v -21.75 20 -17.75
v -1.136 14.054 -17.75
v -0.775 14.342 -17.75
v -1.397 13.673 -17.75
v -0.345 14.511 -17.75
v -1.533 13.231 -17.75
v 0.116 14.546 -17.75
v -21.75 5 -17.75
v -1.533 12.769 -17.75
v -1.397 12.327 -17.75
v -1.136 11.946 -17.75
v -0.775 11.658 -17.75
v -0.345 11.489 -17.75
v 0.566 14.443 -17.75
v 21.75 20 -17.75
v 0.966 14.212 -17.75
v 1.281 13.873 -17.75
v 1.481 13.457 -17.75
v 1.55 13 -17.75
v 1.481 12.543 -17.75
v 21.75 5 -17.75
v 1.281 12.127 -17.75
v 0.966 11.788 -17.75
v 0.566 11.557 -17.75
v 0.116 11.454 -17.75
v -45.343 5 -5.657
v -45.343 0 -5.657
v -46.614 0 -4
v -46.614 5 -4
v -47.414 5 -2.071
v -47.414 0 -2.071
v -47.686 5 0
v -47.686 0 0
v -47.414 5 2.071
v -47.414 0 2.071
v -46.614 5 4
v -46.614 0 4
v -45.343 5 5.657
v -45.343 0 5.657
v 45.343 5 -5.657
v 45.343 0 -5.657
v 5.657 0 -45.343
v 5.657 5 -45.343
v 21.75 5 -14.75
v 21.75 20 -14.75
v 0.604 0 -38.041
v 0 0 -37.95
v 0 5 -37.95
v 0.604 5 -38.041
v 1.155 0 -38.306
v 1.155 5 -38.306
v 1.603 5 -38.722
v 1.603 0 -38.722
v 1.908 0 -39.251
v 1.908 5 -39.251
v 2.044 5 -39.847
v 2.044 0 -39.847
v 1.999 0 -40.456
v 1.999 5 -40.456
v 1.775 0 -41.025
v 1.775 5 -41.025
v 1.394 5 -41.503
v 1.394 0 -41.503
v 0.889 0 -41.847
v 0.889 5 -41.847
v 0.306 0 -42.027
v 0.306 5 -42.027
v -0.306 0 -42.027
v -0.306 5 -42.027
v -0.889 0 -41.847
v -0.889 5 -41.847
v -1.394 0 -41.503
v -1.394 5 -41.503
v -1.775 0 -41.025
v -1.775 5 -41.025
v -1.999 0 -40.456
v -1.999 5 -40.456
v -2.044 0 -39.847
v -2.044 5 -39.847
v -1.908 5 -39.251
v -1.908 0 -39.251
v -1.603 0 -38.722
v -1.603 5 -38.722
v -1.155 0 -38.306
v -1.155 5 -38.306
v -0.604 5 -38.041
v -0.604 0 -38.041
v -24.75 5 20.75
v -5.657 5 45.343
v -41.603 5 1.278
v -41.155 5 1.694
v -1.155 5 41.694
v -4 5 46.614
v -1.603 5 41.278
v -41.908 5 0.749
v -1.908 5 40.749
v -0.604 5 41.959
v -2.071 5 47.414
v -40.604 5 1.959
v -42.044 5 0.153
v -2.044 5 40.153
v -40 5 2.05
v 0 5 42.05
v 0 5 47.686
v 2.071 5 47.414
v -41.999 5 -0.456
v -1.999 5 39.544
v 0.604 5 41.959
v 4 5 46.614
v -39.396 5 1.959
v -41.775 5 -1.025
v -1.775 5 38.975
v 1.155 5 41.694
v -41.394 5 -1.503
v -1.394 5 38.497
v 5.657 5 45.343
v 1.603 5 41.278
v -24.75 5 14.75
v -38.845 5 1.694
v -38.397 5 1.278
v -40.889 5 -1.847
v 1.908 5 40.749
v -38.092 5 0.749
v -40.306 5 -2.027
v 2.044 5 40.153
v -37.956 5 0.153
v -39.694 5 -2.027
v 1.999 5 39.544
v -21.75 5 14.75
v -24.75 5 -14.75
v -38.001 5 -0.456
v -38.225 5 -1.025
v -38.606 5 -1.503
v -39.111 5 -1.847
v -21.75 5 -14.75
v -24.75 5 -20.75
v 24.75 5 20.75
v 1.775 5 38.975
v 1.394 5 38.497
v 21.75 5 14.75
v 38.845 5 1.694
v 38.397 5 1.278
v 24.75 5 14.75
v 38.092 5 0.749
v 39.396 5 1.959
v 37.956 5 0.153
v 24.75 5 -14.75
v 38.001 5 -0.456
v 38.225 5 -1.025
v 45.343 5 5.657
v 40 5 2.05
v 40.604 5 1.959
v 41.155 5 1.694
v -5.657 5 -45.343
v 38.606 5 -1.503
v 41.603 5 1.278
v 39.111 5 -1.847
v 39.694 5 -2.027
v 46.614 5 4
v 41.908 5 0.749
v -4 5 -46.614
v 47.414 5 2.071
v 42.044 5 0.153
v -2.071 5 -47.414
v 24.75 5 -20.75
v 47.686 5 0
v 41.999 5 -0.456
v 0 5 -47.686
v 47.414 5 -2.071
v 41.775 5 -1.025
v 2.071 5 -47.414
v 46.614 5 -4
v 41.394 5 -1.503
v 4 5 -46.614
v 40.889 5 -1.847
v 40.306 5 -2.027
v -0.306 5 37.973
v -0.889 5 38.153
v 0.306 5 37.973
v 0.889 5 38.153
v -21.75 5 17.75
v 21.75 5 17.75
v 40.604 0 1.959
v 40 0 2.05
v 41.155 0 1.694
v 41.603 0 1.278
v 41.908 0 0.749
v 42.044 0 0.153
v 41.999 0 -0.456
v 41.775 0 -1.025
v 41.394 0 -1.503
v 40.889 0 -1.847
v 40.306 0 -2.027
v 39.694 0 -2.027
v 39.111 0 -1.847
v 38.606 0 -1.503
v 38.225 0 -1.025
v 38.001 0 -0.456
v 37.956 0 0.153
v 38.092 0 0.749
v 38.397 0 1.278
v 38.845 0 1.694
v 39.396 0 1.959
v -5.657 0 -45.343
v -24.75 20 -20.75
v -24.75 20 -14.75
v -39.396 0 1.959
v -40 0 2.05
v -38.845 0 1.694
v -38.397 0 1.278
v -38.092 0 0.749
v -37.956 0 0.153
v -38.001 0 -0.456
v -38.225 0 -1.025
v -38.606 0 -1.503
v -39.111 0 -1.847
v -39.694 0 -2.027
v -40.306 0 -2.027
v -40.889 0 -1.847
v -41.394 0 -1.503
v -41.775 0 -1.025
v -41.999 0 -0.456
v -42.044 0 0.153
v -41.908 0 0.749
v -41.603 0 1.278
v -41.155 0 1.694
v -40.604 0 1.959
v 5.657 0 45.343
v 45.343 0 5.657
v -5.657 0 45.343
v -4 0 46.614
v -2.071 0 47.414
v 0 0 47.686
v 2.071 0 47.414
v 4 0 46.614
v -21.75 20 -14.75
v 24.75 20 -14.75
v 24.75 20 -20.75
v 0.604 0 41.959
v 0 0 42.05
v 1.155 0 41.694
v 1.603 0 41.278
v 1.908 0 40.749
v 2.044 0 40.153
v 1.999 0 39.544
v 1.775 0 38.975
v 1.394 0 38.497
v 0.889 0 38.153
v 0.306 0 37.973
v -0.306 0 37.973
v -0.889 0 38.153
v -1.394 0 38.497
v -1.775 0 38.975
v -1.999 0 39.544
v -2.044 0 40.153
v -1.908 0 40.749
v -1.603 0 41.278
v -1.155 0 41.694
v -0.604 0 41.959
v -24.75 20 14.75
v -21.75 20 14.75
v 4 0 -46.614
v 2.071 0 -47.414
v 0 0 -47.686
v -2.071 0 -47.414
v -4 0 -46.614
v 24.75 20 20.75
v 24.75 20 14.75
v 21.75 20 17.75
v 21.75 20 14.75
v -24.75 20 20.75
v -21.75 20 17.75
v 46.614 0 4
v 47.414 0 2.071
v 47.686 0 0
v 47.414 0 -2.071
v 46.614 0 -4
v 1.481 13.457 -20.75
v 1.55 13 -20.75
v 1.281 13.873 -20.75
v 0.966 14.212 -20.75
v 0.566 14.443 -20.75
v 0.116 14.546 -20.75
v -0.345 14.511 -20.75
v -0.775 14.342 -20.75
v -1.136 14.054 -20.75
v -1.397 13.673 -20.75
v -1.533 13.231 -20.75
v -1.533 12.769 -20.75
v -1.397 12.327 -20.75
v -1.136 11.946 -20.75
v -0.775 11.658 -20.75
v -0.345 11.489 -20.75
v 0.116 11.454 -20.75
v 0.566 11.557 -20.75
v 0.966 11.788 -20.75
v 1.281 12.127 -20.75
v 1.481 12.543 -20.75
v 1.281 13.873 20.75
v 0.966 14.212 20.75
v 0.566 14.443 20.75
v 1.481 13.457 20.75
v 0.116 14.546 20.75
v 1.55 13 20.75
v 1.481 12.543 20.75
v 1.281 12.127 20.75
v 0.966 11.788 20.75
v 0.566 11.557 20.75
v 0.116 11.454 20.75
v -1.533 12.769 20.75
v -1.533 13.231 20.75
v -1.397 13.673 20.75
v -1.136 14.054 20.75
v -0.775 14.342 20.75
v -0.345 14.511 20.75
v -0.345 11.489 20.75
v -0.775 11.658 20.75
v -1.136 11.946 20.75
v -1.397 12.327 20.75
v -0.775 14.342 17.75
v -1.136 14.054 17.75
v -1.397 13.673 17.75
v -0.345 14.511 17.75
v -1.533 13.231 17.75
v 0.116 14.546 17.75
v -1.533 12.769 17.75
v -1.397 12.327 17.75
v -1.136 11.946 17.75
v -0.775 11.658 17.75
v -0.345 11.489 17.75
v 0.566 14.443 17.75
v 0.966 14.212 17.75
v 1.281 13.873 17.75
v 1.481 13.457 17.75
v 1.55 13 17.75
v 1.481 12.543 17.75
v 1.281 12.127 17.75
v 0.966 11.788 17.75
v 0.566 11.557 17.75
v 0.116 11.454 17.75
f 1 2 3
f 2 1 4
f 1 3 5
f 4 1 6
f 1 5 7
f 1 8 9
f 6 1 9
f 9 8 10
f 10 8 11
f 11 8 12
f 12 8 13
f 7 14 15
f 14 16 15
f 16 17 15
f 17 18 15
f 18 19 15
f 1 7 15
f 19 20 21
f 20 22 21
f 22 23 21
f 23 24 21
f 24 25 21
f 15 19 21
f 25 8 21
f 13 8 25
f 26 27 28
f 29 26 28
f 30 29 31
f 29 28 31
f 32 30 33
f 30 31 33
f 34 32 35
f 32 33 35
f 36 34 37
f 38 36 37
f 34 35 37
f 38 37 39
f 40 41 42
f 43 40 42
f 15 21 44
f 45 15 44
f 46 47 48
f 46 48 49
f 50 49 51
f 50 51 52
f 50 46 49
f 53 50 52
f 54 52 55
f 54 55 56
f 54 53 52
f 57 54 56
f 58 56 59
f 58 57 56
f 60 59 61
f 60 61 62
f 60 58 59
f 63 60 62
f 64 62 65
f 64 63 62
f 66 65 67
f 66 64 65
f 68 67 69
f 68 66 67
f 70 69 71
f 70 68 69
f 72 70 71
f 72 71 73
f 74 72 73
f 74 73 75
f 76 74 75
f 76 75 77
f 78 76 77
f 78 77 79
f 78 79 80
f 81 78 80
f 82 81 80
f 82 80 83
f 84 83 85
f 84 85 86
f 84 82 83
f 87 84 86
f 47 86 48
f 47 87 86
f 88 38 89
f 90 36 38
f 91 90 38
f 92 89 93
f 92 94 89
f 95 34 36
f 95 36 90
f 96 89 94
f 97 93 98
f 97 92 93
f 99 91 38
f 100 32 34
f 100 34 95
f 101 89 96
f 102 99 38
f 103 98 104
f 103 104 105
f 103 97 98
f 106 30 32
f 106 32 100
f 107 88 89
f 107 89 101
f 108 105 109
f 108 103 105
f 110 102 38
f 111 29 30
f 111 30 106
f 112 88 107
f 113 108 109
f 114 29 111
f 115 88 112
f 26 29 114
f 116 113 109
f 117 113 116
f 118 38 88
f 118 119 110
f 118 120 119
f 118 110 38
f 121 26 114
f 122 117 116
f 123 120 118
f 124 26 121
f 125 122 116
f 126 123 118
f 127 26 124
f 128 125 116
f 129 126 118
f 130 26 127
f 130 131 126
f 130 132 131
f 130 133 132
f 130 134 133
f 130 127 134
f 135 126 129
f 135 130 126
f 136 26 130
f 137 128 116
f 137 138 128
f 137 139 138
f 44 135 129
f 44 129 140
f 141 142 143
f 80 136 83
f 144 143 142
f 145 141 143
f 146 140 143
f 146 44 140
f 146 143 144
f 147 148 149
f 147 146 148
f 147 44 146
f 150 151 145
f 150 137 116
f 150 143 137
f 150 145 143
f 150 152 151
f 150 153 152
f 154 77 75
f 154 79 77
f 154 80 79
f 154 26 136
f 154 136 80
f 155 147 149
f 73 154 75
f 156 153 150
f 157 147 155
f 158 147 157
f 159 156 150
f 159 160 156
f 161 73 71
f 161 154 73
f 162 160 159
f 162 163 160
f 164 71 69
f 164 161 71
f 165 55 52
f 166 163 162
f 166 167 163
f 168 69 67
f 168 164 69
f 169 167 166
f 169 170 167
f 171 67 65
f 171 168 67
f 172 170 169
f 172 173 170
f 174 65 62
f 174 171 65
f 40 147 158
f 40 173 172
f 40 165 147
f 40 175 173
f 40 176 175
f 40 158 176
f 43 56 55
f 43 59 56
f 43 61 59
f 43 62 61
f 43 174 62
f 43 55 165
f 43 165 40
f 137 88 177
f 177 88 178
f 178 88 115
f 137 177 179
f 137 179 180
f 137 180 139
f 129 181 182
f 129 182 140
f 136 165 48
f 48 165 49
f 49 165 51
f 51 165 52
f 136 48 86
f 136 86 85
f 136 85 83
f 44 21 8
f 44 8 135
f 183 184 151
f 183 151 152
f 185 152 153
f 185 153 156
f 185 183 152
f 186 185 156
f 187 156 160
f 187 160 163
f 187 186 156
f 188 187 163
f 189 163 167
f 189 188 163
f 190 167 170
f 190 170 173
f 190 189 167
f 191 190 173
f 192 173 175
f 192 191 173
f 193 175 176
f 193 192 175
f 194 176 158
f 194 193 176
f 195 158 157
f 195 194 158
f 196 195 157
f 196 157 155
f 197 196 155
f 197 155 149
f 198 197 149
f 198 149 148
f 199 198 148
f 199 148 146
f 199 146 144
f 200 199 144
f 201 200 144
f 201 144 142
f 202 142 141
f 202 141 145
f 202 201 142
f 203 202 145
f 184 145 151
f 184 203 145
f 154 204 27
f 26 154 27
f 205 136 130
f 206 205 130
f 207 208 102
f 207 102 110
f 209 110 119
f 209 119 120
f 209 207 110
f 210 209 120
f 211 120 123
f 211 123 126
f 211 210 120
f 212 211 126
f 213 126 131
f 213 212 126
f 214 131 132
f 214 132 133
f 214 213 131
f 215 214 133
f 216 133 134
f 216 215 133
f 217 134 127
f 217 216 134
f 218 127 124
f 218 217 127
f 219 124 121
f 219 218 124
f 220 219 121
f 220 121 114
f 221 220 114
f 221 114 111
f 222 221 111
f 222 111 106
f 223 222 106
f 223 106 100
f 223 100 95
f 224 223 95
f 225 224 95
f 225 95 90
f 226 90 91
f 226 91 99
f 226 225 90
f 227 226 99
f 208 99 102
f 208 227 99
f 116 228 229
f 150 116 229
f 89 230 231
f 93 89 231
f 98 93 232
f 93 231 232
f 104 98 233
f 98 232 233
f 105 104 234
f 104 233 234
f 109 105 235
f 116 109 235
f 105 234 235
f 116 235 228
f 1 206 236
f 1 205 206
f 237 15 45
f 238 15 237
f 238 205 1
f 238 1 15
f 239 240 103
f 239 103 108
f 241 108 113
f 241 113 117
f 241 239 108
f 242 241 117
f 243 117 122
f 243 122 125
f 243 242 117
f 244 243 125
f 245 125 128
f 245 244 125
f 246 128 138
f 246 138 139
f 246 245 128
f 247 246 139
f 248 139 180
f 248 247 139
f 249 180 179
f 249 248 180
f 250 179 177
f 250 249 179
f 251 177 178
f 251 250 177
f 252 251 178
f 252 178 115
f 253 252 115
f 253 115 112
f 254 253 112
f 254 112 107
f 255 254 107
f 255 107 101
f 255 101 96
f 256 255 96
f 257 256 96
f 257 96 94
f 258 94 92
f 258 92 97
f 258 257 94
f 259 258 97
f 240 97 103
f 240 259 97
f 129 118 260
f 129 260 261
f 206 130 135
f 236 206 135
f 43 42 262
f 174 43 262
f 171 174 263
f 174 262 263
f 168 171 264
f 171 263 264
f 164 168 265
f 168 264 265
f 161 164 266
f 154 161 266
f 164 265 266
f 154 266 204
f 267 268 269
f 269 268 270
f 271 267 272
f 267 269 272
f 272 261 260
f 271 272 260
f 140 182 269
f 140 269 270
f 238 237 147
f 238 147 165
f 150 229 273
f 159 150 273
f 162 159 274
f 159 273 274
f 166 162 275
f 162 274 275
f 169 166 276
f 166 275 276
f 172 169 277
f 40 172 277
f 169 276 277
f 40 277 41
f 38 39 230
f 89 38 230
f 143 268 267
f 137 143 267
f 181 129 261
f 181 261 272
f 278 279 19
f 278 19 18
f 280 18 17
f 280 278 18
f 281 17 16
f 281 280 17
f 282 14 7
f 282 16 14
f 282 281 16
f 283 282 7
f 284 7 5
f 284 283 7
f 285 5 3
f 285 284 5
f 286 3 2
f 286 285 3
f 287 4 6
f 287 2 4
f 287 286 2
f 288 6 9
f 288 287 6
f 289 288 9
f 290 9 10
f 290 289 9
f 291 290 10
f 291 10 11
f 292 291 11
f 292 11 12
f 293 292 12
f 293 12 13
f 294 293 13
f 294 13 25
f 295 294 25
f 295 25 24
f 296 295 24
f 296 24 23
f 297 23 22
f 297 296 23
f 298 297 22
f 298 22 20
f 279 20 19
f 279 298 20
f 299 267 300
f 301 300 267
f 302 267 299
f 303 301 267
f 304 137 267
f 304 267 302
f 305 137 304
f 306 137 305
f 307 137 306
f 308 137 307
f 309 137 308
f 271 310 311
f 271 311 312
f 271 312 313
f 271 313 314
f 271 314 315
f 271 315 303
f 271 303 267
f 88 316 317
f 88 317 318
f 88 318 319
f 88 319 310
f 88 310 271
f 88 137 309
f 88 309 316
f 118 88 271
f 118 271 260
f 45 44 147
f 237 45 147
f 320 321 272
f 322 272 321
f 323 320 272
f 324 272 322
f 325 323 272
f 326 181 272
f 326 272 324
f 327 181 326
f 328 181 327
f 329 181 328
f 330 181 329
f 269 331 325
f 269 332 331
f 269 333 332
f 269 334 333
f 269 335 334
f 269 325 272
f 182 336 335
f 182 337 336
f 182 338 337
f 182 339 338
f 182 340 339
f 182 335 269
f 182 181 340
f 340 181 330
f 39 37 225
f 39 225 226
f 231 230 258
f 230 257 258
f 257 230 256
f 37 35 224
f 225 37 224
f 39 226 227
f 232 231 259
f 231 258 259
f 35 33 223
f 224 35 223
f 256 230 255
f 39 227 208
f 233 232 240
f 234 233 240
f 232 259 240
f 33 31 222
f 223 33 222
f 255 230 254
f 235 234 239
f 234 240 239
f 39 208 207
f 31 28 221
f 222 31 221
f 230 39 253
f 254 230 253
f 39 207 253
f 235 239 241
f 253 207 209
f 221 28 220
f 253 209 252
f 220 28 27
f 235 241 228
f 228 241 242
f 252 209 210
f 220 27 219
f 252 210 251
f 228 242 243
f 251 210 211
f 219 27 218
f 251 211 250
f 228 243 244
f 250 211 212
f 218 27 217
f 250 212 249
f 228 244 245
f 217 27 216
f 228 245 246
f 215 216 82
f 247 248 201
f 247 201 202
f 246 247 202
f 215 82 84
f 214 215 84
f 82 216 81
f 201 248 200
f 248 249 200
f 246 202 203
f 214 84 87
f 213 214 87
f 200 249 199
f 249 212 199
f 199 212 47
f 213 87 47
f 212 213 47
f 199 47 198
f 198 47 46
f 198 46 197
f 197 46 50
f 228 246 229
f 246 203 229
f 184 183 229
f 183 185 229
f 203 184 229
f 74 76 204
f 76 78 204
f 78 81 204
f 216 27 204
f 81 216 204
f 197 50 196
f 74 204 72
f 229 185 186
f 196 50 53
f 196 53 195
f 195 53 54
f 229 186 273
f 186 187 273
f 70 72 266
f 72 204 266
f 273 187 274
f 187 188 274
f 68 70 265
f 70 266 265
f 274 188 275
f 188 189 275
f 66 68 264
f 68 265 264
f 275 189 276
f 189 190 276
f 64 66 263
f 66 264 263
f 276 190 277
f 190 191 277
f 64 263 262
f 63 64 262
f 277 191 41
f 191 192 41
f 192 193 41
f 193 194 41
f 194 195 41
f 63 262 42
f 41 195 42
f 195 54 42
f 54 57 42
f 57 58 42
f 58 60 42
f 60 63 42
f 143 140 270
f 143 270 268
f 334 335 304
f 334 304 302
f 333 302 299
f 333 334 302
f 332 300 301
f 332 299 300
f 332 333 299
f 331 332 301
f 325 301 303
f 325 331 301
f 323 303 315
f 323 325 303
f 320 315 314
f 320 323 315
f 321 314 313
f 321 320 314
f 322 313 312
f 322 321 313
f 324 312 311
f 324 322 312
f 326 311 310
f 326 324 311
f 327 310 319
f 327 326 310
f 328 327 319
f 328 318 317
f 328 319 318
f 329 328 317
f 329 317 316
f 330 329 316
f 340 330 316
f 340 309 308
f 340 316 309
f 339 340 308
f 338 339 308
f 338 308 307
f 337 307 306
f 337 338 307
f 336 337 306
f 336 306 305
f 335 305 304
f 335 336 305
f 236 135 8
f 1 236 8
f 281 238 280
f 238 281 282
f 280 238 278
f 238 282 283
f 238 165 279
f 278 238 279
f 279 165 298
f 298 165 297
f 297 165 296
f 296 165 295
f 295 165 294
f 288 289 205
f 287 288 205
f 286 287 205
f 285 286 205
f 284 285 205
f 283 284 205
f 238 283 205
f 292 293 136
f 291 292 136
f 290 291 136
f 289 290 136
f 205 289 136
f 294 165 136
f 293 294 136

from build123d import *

# Parameters (mm, degrees)
SKETCH_1_R               = 2.05
EXTRUDE_1_DEPTH          = 5
EXTRUDE_2_DEPTH          = 15
CUT_EXTRUDE_1_DEPTH      = 86.775919648
CUT_EXTRUDE_1_DEPTH_BACK = 86.775919648
SKETCH_3_R               = 1.55


with BuildPart() as part:
    # 草图1 → 凸台-拉伸1 (new body)
    with BuildSketch(Plane(origin=(0, 0, 0), x_dir=(1, 0, 0), z_dir=(0, 1, 0))):
        with BuildLine():
            Line((-5.656854249, 45.343145751), (-45.343145751, 5.656854249))
            ThreePointArc((-45.343145751, 5.656854249), (-47.686291501, 0), (-45.343145751, -5.656854249))
            Line((-45.343145751, -5.656854249), (-5.656854249, -45.343145751))
            ThreePointArc((-5.656854249, -45.343145751), (0, -47.686291501), (5.656854249, -45.343145751))
            Line((5.656854249, -45.343145751), (45.343145751, -5.656854249))
            ThreePointArc((45.343145751, -5.656854249), (47.686291501, 0), (45.343145751, 5.656854249))
            Line((45.343145751, 5.656854249), (5.656854249, 45.343145751))
            ThreePointArc((5.656854249, 45.343145751), (0, 47.686291501), (-5.656854249, 45.343145751))
        make_face()
        with Locations(Location((0, 40, 0), (0, 0, 270))):
            Circle(SKETCH_1_R, mode=Mode.SUBTRACT)
        with Locations(Location((40, 0, 0), (0, 0, 270))):
            Circle(SKETCH_1_R, mode=Mode.SUBTRACT)
        with Locations(Location((0, -40, 0), (0, 0, 270))):
            Circle(SKETCH_1_R, mode=Mode.SUBTRACT)
        with Locations(Location((-40, 0, 0), (0, 0, 270))):
            Circle(SKETCH_1_R, mode=Mode.SUBTRACT)
    extrude(amount=EXTRUDE_1_DEPTH)

    # 草图2 → 凸台-拉伸2 (add)
    with BuildSketch(Plane(origin=(0, 5, 0), x_dir=(1, 0, 0), z_dir=(0, 1, 0))):
        Polygon((-24.75, 14.75), (-21.75, 14.75), (-21.75, 17.75), (21.75, 17.75), (21.75, 14.75), (24.75, 14.75), (24.75, 20.75), (-24.75, 20.75), align=None)
        Polygon((24.75, -20.75), (-24.75, -20.75), (-24.75, -14.75), (-21.75, -14.75), (-21.75, -17.75), (21.75, -17.75), (21.75, -14.75), (24.75, -14.75), align=None)
    extrude(amount=EXTRUDE_2_DEPTH)

    # 草图3 → 切除-拉伸1 (cut, two sides: drawn at the far end of the back side and taken through both)
    with BuildSketch(Plane.XY.offset(20.75).offset(-CUT_EXTRUDE_1_DEPTH_BACK)):
        with Locations((0, 13)):
            Circle(SKETCH_3_R)
    extrude(amount=CUT_EXTRUDE_1_DEPTH + CUT_EXTRUDE_1_DEPTH_BACK, mode=Mode.SUBTRACT)


solid = part.part
